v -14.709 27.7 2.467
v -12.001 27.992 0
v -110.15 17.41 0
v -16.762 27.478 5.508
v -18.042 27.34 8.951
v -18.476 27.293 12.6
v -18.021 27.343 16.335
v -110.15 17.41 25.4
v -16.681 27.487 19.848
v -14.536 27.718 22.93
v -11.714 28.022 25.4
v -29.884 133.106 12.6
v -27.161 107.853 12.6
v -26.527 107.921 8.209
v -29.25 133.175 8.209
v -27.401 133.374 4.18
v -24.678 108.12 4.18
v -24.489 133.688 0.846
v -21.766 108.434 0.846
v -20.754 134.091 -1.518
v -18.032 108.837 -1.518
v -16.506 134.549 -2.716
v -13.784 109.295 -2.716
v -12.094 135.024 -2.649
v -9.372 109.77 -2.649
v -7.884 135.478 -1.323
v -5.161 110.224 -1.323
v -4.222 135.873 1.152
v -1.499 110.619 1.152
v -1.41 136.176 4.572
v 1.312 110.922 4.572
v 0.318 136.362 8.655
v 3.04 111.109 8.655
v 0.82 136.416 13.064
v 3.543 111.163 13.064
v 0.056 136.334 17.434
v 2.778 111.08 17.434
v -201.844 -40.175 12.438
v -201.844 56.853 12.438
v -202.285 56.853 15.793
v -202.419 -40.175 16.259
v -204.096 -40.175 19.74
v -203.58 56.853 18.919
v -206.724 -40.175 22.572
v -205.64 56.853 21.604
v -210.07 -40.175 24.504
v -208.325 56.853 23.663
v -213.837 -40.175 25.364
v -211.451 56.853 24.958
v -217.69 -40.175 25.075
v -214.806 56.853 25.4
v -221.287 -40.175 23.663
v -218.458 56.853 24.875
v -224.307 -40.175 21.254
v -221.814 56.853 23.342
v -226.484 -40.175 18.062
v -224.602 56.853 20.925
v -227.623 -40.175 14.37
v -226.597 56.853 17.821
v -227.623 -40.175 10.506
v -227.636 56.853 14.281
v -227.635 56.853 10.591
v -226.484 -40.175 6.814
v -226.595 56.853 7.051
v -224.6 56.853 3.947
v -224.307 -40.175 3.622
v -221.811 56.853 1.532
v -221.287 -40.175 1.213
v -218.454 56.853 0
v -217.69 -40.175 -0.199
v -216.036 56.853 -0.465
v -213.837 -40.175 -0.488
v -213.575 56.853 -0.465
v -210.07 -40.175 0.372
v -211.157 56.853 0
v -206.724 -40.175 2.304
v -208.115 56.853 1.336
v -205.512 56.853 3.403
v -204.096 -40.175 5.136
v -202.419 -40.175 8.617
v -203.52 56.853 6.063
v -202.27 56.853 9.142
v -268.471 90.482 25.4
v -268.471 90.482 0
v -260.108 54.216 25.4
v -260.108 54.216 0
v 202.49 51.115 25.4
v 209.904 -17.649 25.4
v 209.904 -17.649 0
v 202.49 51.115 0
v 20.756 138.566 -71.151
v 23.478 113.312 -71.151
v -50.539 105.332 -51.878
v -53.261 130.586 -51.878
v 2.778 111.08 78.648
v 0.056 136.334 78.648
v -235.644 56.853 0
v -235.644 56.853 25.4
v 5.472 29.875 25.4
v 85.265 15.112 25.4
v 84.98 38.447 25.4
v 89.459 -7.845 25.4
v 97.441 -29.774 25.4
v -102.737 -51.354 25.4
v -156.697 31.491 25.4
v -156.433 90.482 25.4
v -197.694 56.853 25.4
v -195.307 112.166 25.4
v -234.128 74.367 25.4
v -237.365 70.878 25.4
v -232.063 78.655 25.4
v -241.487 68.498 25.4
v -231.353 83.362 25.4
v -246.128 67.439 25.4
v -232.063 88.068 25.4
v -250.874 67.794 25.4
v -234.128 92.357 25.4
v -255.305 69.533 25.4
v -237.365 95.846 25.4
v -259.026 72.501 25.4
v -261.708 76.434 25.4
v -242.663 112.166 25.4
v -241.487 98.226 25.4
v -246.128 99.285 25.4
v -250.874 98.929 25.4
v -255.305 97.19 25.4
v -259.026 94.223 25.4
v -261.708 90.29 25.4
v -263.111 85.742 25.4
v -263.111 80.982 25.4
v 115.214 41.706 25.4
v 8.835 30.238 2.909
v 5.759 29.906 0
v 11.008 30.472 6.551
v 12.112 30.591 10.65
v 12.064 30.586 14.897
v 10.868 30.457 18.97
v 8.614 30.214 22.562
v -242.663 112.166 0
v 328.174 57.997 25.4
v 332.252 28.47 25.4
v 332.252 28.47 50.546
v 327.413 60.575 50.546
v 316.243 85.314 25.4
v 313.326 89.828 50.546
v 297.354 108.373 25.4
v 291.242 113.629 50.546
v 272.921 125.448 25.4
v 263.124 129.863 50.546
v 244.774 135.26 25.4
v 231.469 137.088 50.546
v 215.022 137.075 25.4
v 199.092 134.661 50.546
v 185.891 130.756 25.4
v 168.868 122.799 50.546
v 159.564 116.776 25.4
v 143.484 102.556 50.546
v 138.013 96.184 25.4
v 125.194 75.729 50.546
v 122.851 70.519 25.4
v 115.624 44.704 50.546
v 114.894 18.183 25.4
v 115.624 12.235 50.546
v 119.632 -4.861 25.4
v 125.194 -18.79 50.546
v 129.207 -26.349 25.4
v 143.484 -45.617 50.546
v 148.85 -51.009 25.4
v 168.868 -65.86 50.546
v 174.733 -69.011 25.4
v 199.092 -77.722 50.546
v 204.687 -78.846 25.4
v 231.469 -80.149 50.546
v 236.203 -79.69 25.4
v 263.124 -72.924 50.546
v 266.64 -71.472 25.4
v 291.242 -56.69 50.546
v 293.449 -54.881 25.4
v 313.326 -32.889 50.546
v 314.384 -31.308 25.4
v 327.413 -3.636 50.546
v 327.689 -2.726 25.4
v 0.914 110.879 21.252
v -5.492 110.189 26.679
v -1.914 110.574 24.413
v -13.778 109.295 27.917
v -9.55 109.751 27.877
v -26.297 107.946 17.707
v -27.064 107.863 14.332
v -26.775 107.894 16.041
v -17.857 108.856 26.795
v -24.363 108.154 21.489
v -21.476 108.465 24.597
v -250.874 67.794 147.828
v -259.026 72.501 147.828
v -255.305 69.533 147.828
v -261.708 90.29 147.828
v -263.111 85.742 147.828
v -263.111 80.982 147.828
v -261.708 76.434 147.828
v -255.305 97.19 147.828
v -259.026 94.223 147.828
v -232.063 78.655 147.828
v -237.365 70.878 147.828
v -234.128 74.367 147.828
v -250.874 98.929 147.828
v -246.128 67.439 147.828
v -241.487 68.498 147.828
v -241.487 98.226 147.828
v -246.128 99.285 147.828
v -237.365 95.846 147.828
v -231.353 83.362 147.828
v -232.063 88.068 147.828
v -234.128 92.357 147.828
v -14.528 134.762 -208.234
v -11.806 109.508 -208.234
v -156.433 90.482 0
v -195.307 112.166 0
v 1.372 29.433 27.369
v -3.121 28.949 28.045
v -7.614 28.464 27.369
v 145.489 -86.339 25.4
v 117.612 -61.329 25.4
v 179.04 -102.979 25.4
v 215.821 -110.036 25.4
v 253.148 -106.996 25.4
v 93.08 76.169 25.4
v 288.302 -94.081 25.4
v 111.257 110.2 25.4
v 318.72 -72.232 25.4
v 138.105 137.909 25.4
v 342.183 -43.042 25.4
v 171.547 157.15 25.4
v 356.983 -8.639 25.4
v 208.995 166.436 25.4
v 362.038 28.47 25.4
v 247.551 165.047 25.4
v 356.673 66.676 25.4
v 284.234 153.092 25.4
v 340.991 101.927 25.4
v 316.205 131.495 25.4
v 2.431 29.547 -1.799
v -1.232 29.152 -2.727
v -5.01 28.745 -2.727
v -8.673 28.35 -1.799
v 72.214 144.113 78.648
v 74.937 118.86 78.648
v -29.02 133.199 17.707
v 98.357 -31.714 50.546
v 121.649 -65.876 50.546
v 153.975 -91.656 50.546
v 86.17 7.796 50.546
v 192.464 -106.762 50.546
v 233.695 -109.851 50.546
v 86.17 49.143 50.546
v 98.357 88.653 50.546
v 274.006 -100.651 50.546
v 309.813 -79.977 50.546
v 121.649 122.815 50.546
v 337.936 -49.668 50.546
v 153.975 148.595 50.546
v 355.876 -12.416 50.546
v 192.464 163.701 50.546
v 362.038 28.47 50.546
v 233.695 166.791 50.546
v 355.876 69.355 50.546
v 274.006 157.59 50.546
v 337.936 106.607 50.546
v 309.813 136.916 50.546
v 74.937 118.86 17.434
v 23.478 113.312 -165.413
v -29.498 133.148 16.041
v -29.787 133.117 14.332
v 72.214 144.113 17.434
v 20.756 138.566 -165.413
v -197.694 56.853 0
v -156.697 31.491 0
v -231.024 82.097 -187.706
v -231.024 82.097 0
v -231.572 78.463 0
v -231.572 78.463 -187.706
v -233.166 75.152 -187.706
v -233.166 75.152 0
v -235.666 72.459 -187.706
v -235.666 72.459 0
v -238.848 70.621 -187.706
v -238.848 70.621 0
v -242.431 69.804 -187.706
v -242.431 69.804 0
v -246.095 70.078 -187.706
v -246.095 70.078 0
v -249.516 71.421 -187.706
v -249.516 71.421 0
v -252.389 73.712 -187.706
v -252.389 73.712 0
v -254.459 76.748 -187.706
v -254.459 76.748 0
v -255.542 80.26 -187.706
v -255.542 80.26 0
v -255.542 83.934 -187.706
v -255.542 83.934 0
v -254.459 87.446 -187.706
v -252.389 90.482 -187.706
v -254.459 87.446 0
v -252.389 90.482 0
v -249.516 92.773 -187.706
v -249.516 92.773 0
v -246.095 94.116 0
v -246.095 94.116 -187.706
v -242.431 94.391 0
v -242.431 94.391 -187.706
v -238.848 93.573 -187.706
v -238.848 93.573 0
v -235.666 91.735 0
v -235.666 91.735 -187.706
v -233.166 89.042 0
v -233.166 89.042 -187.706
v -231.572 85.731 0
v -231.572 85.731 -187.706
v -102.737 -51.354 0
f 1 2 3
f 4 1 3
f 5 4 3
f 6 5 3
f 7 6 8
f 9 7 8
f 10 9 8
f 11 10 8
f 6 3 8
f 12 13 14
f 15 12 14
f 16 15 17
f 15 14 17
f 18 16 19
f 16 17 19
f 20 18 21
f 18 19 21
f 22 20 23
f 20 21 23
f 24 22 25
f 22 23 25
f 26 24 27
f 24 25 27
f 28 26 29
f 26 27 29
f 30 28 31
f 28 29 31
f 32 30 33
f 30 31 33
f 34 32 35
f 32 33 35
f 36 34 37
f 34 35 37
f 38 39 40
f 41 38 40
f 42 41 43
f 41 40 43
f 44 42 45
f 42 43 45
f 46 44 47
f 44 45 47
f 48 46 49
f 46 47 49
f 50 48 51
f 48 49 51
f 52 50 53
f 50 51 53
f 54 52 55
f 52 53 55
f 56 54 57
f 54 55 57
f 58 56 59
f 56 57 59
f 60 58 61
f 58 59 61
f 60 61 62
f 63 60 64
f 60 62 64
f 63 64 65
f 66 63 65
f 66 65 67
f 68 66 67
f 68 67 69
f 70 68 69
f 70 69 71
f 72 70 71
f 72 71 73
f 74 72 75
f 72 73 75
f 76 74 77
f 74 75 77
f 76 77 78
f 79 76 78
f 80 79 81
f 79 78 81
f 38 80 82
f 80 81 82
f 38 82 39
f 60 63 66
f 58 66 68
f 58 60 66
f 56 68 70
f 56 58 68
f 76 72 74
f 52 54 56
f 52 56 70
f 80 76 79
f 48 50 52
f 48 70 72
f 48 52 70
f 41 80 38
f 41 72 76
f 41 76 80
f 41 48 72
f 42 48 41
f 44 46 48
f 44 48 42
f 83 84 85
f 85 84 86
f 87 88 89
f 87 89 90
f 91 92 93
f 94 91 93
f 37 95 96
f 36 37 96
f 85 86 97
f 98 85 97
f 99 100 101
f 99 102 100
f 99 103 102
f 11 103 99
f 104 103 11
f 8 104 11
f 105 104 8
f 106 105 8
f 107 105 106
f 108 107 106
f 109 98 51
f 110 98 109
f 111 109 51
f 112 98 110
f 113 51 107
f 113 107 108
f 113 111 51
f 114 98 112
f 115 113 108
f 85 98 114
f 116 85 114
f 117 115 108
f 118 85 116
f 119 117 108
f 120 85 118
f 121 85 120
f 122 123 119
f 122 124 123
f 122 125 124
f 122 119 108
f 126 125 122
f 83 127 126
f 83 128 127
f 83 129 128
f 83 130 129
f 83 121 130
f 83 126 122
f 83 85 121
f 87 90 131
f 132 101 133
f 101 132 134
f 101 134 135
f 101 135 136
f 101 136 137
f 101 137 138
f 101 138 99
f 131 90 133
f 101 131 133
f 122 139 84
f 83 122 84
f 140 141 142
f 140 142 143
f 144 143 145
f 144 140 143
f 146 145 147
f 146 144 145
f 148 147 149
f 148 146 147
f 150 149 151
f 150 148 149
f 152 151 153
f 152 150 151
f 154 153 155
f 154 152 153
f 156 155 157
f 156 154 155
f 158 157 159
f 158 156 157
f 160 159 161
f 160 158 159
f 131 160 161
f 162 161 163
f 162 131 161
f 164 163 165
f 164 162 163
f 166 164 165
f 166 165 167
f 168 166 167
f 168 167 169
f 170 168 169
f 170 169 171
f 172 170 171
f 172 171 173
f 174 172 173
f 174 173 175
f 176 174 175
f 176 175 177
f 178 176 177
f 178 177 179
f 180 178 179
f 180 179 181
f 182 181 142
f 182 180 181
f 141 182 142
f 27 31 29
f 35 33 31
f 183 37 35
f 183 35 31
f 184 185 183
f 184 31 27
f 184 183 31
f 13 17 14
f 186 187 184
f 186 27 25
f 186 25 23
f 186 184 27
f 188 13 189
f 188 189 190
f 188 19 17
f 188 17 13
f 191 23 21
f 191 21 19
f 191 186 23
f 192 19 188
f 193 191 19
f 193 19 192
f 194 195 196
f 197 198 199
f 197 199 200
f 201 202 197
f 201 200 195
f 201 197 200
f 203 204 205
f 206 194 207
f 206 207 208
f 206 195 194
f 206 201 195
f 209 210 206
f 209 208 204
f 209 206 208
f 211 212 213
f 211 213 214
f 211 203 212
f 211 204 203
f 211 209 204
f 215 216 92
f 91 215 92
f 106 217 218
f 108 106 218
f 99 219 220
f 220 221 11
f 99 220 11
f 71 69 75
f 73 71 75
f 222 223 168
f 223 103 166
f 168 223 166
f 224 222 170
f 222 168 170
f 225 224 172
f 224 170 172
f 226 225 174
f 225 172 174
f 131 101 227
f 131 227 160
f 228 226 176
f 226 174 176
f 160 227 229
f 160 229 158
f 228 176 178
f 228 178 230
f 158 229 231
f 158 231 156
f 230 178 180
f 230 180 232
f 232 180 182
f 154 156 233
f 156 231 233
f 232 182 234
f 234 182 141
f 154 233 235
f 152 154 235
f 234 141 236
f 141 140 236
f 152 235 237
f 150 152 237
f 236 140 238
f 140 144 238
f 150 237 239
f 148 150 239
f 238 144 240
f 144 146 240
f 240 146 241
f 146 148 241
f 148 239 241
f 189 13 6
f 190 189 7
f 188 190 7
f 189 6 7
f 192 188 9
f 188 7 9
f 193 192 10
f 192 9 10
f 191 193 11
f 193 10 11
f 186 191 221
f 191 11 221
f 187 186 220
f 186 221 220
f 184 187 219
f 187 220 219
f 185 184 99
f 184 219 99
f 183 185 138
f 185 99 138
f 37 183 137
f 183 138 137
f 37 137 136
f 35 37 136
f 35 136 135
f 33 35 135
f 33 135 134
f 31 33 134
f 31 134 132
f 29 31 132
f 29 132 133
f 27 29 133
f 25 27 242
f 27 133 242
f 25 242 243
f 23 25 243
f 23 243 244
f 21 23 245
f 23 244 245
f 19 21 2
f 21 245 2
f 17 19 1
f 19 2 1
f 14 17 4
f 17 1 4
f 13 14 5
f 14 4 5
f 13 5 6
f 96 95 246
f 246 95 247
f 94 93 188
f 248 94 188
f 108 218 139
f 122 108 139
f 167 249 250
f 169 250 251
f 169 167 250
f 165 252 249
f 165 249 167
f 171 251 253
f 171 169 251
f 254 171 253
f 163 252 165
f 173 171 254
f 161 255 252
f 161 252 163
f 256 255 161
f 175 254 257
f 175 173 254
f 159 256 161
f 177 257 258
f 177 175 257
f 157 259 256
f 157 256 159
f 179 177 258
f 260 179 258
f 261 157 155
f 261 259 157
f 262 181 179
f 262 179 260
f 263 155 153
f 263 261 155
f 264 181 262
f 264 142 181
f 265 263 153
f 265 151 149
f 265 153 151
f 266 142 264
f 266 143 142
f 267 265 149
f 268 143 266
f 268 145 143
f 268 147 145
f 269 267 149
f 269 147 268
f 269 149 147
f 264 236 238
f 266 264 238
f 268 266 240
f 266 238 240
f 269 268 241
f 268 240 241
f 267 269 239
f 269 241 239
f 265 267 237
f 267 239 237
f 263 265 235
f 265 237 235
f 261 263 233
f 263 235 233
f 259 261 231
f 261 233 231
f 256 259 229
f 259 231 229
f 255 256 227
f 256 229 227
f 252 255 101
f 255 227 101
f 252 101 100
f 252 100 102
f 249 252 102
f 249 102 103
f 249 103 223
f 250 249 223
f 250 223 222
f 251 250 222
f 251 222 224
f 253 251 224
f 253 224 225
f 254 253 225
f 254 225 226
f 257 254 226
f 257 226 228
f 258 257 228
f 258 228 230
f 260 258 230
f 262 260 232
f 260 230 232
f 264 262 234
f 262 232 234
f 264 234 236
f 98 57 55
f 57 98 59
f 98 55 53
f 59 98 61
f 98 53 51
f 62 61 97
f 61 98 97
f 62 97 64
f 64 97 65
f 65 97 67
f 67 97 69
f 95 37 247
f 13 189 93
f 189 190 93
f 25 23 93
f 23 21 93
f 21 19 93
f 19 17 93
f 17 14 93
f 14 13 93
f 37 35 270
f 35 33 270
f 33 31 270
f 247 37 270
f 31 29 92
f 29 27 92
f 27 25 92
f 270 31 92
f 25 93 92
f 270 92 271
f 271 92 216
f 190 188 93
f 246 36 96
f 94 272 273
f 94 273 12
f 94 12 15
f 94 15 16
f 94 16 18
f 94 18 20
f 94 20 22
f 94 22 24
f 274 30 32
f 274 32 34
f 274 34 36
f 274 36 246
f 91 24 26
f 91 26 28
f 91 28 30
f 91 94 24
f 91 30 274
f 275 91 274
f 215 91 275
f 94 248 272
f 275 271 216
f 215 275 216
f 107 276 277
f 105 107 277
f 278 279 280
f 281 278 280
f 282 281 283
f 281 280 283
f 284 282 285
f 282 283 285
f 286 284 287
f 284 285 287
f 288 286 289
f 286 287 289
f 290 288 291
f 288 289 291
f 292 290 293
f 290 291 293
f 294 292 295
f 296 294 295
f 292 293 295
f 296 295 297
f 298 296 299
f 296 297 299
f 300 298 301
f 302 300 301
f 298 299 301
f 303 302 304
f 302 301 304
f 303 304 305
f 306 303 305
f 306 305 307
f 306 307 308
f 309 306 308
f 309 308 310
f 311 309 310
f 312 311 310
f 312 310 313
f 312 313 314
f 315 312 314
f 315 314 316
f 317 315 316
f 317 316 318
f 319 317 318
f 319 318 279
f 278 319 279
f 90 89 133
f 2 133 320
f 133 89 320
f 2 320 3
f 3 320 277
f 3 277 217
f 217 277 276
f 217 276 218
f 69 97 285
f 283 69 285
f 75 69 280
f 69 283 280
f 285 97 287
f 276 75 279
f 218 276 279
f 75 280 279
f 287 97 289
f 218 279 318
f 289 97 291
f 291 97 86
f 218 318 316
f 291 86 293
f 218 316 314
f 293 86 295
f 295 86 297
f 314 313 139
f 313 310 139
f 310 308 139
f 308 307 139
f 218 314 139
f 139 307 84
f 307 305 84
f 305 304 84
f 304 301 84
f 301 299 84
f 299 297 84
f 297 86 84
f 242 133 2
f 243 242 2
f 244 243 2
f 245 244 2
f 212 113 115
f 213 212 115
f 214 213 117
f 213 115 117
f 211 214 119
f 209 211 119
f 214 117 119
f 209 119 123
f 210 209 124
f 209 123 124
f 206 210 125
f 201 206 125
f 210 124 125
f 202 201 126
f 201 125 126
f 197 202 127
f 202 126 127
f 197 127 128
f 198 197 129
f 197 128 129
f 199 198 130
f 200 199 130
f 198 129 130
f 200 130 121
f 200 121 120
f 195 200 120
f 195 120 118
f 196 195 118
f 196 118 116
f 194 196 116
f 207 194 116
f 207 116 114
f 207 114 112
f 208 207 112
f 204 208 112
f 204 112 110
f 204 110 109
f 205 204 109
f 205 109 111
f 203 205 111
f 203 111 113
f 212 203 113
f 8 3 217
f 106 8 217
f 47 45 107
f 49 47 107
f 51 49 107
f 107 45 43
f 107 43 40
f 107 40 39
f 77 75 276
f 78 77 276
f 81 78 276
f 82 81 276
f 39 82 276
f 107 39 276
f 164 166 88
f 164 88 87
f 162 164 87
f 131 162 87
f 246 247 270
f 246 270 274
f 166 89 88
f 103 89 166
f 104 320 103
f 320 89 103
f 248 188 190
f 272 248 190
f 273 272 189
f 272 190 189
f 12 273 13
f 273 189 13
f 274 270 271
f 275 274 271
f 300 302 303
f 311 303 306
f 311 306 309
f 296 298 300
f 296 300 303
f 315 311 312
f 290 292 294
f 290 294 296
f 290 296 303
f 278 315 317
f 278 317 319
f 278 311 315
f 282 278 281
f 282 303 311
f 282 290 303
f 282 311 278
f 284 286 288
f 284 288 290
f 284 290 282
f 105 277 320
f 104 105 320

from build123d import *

# Parameters (mm, degrees)
F0_R      = 15.9677519262
F1_DEPTH  = 21.336
F2_DEPTH  = 147.828
F3_R      = 12.3279515552
F4_DEPTH  = 187.706
F5_DEPTH  = 25.4
F6_W      = 69.1631390607
F6_H      = 25.4
F7_DEPTH  = 314.452
F8_R      = 138.7088529406
F8_R_2    = 108.9226078154
F9_DEPTH  = 25.146
F10_R     = 15.44449375
F11_DEPTH = 81.026
F13_DEPTH = 25.4
F14_DEPTH = 61.214
F15_R     = 12.9620128587
F16_DEPTH = 97.028


with BuildPart() as f1:
    # F0 (on Top) → F1 (new body)
    with BuildSketch(Plane.XY):
        Polygon((-156.6965579987, 31.491111964), (-102.7367115021, -51.3543523848), (-110.150039196, 17.4103360623), (-156.4325243235, 90.4818549752), (-195.3068226576, 112.1664866805), (-242.6634728909, 112.1664866805), (-268.4712409973, 90.4818549752), (-260.1083906974, 54.2156940101), (-235.6438338757, 56.8531490862), (-197.6939886808, 56.8531490862), align=None)
        with Locations((-247.3211288452, 83.3618193865)):
            Circle(F0_R, mode=Mode.SUBTRACT)
        with Locations((-247.3211288452, 83.3618193865)):
            Circle(F0_R)
    extrude(amount=F1_DEPTH)

    # F0 (on Top) → F2 (join)
    with BuildSketch(Plane.XY):
        with Locations((-247.3211288452, 83.3618193865)):
            Circle(F0_R)
    extrude(amount=F2_DEPTH)

    # F3 (on face) → F4 (join)
    with BuildSketch(Plane(origin=(0, 0, 0), x_dir=(1, 0, 0), z_dir=(0, 0, -1))):
        with Locations((-243.3518618345, -82.0970386267)):
            Circle(F3_R)
    extrude(amount=F4_DEPTH)

    # F0 (on Top) → F5 (join)
    with BuildSketch(Plane.XY):
        Polygon((-156.6965579987, 31.491111964), (-102.7367115021, -51.3543523848), (-110.150039196, 17.4103360623), (-156.4325243235, 90.4818549752), (-195.3068226576, 112.1664866805), (-242.6634728909, 112.1664866805), (-268.4712409973, 90.4818549752), (-260.1083906974, 54.2156940101), (-235.6438338757, 56.8531490862), (-197.6939886808, 56.8531490862), align=None)
        with Locations((-247.3211288452, 83.3618193865)):
            Circle(F0_R, mode=Mode.SUBTRACT)
    extrude(amount=F5_DEPTH)

    # F6 (on face) → F7 (join)
    with BuildSketch(Plane(origin=(-107.0291453779, -11.5385111953, 0), x_dir=(-0.107186108, 0.9942389744, 0), z_dir=(0.9942389744, 0.107186108, 0))):
        with Locations((-5.4649808605, 12.7)):
            Rectangle(F6_W, F6_H)
    extrude(amount=F7_DEPTH)

    # F8 (on face) → F9 (join)
    with BuildSketch(Plane.XY.offset(25.4)):
        with Locations((223.3296185732, 28.4695085138)):
            Circle(F8_R)
        with Locations((223.3296185732, 28.4695085138)):
            Circle(F8_R_2, mode=Mode.SUBTRACT)
    extrude(amount=F9_DEPTH)

    # F10 (on face) → F11 (join)
    with BuildSketch(Plane(origin=(-3.1208938182, 28.9488472576, 0), x_dir=(-0.9942389744, -0.107186108, 0), z_dir=(-0.107186108, 0.9942389744, 0))):
        with Locations((0, 12.6002421603)):
            Circle(F10_R)
    extrude(amount=F11_DEPTH)



with BuildPart() as f13:
    # F12 (on face) → F13 (new body)
    with BuildSketch(Plane(origin=(-11.8057554061, 109.5080543987, 0), x_dir=(-0.9942389744, -0.107186108, 0), z_dir=(-0.107186108, 0.9942389744, 0))):
        with BuildLine():
            ThreePointArc((15.44449375, 12.6002421603), (-2.4479012005, -2.6490255895), (-14.6685252547, 17.4341592101))
            Line((-14.6685252547, 17.4341592101), (-87.2451700878, 17.4341592101))
            Line((-87.2451700878, 17.4341592101), (-35.4883559048, -165.4134243727))
            Line((-35.4883559048, -165.4134243727), (0, -208.2339674234))
            Line((0, -208.2339674234), (-35.4883559048, -71.1505264044))
            Line((-35.4883559048, -71.1505264044), (38.9573626197, -51.8779130606))
            Line((38.9573626197, -51.8779130606), (14.5756592471, 17.7073494339))
            ThreePointArc((14.5756592471, 17.7073494339), (15.2257358662, 15.1904843351), (15.44449375, 12.6002421603))
        make_face()
    extrude(amount=F13_DEPTH)


with BuildPart() as f1_1:
    add(f1.part)
    # F14 (add): a face of the model
    f14_faces = [f13.part.faces().sort_by_distance(p)[0] for p in [
        (37.4962649903, 127.5967555523, 17.4341592101),
    ]]

    add(f13.part)  # F14 merges F13
    extrude(f14_faces, amount=F14_DEPTH)

    # F15 (on face) → F16 (join)
    with BuildSketch(Plane.XZ.offset(-56.8531490862)):
        with Locations((-214.8055583239, 12.4379871413)):
            Circle(F15_R)
    extrude(amount=F16_DEPTH)


solid = f1_1.part
